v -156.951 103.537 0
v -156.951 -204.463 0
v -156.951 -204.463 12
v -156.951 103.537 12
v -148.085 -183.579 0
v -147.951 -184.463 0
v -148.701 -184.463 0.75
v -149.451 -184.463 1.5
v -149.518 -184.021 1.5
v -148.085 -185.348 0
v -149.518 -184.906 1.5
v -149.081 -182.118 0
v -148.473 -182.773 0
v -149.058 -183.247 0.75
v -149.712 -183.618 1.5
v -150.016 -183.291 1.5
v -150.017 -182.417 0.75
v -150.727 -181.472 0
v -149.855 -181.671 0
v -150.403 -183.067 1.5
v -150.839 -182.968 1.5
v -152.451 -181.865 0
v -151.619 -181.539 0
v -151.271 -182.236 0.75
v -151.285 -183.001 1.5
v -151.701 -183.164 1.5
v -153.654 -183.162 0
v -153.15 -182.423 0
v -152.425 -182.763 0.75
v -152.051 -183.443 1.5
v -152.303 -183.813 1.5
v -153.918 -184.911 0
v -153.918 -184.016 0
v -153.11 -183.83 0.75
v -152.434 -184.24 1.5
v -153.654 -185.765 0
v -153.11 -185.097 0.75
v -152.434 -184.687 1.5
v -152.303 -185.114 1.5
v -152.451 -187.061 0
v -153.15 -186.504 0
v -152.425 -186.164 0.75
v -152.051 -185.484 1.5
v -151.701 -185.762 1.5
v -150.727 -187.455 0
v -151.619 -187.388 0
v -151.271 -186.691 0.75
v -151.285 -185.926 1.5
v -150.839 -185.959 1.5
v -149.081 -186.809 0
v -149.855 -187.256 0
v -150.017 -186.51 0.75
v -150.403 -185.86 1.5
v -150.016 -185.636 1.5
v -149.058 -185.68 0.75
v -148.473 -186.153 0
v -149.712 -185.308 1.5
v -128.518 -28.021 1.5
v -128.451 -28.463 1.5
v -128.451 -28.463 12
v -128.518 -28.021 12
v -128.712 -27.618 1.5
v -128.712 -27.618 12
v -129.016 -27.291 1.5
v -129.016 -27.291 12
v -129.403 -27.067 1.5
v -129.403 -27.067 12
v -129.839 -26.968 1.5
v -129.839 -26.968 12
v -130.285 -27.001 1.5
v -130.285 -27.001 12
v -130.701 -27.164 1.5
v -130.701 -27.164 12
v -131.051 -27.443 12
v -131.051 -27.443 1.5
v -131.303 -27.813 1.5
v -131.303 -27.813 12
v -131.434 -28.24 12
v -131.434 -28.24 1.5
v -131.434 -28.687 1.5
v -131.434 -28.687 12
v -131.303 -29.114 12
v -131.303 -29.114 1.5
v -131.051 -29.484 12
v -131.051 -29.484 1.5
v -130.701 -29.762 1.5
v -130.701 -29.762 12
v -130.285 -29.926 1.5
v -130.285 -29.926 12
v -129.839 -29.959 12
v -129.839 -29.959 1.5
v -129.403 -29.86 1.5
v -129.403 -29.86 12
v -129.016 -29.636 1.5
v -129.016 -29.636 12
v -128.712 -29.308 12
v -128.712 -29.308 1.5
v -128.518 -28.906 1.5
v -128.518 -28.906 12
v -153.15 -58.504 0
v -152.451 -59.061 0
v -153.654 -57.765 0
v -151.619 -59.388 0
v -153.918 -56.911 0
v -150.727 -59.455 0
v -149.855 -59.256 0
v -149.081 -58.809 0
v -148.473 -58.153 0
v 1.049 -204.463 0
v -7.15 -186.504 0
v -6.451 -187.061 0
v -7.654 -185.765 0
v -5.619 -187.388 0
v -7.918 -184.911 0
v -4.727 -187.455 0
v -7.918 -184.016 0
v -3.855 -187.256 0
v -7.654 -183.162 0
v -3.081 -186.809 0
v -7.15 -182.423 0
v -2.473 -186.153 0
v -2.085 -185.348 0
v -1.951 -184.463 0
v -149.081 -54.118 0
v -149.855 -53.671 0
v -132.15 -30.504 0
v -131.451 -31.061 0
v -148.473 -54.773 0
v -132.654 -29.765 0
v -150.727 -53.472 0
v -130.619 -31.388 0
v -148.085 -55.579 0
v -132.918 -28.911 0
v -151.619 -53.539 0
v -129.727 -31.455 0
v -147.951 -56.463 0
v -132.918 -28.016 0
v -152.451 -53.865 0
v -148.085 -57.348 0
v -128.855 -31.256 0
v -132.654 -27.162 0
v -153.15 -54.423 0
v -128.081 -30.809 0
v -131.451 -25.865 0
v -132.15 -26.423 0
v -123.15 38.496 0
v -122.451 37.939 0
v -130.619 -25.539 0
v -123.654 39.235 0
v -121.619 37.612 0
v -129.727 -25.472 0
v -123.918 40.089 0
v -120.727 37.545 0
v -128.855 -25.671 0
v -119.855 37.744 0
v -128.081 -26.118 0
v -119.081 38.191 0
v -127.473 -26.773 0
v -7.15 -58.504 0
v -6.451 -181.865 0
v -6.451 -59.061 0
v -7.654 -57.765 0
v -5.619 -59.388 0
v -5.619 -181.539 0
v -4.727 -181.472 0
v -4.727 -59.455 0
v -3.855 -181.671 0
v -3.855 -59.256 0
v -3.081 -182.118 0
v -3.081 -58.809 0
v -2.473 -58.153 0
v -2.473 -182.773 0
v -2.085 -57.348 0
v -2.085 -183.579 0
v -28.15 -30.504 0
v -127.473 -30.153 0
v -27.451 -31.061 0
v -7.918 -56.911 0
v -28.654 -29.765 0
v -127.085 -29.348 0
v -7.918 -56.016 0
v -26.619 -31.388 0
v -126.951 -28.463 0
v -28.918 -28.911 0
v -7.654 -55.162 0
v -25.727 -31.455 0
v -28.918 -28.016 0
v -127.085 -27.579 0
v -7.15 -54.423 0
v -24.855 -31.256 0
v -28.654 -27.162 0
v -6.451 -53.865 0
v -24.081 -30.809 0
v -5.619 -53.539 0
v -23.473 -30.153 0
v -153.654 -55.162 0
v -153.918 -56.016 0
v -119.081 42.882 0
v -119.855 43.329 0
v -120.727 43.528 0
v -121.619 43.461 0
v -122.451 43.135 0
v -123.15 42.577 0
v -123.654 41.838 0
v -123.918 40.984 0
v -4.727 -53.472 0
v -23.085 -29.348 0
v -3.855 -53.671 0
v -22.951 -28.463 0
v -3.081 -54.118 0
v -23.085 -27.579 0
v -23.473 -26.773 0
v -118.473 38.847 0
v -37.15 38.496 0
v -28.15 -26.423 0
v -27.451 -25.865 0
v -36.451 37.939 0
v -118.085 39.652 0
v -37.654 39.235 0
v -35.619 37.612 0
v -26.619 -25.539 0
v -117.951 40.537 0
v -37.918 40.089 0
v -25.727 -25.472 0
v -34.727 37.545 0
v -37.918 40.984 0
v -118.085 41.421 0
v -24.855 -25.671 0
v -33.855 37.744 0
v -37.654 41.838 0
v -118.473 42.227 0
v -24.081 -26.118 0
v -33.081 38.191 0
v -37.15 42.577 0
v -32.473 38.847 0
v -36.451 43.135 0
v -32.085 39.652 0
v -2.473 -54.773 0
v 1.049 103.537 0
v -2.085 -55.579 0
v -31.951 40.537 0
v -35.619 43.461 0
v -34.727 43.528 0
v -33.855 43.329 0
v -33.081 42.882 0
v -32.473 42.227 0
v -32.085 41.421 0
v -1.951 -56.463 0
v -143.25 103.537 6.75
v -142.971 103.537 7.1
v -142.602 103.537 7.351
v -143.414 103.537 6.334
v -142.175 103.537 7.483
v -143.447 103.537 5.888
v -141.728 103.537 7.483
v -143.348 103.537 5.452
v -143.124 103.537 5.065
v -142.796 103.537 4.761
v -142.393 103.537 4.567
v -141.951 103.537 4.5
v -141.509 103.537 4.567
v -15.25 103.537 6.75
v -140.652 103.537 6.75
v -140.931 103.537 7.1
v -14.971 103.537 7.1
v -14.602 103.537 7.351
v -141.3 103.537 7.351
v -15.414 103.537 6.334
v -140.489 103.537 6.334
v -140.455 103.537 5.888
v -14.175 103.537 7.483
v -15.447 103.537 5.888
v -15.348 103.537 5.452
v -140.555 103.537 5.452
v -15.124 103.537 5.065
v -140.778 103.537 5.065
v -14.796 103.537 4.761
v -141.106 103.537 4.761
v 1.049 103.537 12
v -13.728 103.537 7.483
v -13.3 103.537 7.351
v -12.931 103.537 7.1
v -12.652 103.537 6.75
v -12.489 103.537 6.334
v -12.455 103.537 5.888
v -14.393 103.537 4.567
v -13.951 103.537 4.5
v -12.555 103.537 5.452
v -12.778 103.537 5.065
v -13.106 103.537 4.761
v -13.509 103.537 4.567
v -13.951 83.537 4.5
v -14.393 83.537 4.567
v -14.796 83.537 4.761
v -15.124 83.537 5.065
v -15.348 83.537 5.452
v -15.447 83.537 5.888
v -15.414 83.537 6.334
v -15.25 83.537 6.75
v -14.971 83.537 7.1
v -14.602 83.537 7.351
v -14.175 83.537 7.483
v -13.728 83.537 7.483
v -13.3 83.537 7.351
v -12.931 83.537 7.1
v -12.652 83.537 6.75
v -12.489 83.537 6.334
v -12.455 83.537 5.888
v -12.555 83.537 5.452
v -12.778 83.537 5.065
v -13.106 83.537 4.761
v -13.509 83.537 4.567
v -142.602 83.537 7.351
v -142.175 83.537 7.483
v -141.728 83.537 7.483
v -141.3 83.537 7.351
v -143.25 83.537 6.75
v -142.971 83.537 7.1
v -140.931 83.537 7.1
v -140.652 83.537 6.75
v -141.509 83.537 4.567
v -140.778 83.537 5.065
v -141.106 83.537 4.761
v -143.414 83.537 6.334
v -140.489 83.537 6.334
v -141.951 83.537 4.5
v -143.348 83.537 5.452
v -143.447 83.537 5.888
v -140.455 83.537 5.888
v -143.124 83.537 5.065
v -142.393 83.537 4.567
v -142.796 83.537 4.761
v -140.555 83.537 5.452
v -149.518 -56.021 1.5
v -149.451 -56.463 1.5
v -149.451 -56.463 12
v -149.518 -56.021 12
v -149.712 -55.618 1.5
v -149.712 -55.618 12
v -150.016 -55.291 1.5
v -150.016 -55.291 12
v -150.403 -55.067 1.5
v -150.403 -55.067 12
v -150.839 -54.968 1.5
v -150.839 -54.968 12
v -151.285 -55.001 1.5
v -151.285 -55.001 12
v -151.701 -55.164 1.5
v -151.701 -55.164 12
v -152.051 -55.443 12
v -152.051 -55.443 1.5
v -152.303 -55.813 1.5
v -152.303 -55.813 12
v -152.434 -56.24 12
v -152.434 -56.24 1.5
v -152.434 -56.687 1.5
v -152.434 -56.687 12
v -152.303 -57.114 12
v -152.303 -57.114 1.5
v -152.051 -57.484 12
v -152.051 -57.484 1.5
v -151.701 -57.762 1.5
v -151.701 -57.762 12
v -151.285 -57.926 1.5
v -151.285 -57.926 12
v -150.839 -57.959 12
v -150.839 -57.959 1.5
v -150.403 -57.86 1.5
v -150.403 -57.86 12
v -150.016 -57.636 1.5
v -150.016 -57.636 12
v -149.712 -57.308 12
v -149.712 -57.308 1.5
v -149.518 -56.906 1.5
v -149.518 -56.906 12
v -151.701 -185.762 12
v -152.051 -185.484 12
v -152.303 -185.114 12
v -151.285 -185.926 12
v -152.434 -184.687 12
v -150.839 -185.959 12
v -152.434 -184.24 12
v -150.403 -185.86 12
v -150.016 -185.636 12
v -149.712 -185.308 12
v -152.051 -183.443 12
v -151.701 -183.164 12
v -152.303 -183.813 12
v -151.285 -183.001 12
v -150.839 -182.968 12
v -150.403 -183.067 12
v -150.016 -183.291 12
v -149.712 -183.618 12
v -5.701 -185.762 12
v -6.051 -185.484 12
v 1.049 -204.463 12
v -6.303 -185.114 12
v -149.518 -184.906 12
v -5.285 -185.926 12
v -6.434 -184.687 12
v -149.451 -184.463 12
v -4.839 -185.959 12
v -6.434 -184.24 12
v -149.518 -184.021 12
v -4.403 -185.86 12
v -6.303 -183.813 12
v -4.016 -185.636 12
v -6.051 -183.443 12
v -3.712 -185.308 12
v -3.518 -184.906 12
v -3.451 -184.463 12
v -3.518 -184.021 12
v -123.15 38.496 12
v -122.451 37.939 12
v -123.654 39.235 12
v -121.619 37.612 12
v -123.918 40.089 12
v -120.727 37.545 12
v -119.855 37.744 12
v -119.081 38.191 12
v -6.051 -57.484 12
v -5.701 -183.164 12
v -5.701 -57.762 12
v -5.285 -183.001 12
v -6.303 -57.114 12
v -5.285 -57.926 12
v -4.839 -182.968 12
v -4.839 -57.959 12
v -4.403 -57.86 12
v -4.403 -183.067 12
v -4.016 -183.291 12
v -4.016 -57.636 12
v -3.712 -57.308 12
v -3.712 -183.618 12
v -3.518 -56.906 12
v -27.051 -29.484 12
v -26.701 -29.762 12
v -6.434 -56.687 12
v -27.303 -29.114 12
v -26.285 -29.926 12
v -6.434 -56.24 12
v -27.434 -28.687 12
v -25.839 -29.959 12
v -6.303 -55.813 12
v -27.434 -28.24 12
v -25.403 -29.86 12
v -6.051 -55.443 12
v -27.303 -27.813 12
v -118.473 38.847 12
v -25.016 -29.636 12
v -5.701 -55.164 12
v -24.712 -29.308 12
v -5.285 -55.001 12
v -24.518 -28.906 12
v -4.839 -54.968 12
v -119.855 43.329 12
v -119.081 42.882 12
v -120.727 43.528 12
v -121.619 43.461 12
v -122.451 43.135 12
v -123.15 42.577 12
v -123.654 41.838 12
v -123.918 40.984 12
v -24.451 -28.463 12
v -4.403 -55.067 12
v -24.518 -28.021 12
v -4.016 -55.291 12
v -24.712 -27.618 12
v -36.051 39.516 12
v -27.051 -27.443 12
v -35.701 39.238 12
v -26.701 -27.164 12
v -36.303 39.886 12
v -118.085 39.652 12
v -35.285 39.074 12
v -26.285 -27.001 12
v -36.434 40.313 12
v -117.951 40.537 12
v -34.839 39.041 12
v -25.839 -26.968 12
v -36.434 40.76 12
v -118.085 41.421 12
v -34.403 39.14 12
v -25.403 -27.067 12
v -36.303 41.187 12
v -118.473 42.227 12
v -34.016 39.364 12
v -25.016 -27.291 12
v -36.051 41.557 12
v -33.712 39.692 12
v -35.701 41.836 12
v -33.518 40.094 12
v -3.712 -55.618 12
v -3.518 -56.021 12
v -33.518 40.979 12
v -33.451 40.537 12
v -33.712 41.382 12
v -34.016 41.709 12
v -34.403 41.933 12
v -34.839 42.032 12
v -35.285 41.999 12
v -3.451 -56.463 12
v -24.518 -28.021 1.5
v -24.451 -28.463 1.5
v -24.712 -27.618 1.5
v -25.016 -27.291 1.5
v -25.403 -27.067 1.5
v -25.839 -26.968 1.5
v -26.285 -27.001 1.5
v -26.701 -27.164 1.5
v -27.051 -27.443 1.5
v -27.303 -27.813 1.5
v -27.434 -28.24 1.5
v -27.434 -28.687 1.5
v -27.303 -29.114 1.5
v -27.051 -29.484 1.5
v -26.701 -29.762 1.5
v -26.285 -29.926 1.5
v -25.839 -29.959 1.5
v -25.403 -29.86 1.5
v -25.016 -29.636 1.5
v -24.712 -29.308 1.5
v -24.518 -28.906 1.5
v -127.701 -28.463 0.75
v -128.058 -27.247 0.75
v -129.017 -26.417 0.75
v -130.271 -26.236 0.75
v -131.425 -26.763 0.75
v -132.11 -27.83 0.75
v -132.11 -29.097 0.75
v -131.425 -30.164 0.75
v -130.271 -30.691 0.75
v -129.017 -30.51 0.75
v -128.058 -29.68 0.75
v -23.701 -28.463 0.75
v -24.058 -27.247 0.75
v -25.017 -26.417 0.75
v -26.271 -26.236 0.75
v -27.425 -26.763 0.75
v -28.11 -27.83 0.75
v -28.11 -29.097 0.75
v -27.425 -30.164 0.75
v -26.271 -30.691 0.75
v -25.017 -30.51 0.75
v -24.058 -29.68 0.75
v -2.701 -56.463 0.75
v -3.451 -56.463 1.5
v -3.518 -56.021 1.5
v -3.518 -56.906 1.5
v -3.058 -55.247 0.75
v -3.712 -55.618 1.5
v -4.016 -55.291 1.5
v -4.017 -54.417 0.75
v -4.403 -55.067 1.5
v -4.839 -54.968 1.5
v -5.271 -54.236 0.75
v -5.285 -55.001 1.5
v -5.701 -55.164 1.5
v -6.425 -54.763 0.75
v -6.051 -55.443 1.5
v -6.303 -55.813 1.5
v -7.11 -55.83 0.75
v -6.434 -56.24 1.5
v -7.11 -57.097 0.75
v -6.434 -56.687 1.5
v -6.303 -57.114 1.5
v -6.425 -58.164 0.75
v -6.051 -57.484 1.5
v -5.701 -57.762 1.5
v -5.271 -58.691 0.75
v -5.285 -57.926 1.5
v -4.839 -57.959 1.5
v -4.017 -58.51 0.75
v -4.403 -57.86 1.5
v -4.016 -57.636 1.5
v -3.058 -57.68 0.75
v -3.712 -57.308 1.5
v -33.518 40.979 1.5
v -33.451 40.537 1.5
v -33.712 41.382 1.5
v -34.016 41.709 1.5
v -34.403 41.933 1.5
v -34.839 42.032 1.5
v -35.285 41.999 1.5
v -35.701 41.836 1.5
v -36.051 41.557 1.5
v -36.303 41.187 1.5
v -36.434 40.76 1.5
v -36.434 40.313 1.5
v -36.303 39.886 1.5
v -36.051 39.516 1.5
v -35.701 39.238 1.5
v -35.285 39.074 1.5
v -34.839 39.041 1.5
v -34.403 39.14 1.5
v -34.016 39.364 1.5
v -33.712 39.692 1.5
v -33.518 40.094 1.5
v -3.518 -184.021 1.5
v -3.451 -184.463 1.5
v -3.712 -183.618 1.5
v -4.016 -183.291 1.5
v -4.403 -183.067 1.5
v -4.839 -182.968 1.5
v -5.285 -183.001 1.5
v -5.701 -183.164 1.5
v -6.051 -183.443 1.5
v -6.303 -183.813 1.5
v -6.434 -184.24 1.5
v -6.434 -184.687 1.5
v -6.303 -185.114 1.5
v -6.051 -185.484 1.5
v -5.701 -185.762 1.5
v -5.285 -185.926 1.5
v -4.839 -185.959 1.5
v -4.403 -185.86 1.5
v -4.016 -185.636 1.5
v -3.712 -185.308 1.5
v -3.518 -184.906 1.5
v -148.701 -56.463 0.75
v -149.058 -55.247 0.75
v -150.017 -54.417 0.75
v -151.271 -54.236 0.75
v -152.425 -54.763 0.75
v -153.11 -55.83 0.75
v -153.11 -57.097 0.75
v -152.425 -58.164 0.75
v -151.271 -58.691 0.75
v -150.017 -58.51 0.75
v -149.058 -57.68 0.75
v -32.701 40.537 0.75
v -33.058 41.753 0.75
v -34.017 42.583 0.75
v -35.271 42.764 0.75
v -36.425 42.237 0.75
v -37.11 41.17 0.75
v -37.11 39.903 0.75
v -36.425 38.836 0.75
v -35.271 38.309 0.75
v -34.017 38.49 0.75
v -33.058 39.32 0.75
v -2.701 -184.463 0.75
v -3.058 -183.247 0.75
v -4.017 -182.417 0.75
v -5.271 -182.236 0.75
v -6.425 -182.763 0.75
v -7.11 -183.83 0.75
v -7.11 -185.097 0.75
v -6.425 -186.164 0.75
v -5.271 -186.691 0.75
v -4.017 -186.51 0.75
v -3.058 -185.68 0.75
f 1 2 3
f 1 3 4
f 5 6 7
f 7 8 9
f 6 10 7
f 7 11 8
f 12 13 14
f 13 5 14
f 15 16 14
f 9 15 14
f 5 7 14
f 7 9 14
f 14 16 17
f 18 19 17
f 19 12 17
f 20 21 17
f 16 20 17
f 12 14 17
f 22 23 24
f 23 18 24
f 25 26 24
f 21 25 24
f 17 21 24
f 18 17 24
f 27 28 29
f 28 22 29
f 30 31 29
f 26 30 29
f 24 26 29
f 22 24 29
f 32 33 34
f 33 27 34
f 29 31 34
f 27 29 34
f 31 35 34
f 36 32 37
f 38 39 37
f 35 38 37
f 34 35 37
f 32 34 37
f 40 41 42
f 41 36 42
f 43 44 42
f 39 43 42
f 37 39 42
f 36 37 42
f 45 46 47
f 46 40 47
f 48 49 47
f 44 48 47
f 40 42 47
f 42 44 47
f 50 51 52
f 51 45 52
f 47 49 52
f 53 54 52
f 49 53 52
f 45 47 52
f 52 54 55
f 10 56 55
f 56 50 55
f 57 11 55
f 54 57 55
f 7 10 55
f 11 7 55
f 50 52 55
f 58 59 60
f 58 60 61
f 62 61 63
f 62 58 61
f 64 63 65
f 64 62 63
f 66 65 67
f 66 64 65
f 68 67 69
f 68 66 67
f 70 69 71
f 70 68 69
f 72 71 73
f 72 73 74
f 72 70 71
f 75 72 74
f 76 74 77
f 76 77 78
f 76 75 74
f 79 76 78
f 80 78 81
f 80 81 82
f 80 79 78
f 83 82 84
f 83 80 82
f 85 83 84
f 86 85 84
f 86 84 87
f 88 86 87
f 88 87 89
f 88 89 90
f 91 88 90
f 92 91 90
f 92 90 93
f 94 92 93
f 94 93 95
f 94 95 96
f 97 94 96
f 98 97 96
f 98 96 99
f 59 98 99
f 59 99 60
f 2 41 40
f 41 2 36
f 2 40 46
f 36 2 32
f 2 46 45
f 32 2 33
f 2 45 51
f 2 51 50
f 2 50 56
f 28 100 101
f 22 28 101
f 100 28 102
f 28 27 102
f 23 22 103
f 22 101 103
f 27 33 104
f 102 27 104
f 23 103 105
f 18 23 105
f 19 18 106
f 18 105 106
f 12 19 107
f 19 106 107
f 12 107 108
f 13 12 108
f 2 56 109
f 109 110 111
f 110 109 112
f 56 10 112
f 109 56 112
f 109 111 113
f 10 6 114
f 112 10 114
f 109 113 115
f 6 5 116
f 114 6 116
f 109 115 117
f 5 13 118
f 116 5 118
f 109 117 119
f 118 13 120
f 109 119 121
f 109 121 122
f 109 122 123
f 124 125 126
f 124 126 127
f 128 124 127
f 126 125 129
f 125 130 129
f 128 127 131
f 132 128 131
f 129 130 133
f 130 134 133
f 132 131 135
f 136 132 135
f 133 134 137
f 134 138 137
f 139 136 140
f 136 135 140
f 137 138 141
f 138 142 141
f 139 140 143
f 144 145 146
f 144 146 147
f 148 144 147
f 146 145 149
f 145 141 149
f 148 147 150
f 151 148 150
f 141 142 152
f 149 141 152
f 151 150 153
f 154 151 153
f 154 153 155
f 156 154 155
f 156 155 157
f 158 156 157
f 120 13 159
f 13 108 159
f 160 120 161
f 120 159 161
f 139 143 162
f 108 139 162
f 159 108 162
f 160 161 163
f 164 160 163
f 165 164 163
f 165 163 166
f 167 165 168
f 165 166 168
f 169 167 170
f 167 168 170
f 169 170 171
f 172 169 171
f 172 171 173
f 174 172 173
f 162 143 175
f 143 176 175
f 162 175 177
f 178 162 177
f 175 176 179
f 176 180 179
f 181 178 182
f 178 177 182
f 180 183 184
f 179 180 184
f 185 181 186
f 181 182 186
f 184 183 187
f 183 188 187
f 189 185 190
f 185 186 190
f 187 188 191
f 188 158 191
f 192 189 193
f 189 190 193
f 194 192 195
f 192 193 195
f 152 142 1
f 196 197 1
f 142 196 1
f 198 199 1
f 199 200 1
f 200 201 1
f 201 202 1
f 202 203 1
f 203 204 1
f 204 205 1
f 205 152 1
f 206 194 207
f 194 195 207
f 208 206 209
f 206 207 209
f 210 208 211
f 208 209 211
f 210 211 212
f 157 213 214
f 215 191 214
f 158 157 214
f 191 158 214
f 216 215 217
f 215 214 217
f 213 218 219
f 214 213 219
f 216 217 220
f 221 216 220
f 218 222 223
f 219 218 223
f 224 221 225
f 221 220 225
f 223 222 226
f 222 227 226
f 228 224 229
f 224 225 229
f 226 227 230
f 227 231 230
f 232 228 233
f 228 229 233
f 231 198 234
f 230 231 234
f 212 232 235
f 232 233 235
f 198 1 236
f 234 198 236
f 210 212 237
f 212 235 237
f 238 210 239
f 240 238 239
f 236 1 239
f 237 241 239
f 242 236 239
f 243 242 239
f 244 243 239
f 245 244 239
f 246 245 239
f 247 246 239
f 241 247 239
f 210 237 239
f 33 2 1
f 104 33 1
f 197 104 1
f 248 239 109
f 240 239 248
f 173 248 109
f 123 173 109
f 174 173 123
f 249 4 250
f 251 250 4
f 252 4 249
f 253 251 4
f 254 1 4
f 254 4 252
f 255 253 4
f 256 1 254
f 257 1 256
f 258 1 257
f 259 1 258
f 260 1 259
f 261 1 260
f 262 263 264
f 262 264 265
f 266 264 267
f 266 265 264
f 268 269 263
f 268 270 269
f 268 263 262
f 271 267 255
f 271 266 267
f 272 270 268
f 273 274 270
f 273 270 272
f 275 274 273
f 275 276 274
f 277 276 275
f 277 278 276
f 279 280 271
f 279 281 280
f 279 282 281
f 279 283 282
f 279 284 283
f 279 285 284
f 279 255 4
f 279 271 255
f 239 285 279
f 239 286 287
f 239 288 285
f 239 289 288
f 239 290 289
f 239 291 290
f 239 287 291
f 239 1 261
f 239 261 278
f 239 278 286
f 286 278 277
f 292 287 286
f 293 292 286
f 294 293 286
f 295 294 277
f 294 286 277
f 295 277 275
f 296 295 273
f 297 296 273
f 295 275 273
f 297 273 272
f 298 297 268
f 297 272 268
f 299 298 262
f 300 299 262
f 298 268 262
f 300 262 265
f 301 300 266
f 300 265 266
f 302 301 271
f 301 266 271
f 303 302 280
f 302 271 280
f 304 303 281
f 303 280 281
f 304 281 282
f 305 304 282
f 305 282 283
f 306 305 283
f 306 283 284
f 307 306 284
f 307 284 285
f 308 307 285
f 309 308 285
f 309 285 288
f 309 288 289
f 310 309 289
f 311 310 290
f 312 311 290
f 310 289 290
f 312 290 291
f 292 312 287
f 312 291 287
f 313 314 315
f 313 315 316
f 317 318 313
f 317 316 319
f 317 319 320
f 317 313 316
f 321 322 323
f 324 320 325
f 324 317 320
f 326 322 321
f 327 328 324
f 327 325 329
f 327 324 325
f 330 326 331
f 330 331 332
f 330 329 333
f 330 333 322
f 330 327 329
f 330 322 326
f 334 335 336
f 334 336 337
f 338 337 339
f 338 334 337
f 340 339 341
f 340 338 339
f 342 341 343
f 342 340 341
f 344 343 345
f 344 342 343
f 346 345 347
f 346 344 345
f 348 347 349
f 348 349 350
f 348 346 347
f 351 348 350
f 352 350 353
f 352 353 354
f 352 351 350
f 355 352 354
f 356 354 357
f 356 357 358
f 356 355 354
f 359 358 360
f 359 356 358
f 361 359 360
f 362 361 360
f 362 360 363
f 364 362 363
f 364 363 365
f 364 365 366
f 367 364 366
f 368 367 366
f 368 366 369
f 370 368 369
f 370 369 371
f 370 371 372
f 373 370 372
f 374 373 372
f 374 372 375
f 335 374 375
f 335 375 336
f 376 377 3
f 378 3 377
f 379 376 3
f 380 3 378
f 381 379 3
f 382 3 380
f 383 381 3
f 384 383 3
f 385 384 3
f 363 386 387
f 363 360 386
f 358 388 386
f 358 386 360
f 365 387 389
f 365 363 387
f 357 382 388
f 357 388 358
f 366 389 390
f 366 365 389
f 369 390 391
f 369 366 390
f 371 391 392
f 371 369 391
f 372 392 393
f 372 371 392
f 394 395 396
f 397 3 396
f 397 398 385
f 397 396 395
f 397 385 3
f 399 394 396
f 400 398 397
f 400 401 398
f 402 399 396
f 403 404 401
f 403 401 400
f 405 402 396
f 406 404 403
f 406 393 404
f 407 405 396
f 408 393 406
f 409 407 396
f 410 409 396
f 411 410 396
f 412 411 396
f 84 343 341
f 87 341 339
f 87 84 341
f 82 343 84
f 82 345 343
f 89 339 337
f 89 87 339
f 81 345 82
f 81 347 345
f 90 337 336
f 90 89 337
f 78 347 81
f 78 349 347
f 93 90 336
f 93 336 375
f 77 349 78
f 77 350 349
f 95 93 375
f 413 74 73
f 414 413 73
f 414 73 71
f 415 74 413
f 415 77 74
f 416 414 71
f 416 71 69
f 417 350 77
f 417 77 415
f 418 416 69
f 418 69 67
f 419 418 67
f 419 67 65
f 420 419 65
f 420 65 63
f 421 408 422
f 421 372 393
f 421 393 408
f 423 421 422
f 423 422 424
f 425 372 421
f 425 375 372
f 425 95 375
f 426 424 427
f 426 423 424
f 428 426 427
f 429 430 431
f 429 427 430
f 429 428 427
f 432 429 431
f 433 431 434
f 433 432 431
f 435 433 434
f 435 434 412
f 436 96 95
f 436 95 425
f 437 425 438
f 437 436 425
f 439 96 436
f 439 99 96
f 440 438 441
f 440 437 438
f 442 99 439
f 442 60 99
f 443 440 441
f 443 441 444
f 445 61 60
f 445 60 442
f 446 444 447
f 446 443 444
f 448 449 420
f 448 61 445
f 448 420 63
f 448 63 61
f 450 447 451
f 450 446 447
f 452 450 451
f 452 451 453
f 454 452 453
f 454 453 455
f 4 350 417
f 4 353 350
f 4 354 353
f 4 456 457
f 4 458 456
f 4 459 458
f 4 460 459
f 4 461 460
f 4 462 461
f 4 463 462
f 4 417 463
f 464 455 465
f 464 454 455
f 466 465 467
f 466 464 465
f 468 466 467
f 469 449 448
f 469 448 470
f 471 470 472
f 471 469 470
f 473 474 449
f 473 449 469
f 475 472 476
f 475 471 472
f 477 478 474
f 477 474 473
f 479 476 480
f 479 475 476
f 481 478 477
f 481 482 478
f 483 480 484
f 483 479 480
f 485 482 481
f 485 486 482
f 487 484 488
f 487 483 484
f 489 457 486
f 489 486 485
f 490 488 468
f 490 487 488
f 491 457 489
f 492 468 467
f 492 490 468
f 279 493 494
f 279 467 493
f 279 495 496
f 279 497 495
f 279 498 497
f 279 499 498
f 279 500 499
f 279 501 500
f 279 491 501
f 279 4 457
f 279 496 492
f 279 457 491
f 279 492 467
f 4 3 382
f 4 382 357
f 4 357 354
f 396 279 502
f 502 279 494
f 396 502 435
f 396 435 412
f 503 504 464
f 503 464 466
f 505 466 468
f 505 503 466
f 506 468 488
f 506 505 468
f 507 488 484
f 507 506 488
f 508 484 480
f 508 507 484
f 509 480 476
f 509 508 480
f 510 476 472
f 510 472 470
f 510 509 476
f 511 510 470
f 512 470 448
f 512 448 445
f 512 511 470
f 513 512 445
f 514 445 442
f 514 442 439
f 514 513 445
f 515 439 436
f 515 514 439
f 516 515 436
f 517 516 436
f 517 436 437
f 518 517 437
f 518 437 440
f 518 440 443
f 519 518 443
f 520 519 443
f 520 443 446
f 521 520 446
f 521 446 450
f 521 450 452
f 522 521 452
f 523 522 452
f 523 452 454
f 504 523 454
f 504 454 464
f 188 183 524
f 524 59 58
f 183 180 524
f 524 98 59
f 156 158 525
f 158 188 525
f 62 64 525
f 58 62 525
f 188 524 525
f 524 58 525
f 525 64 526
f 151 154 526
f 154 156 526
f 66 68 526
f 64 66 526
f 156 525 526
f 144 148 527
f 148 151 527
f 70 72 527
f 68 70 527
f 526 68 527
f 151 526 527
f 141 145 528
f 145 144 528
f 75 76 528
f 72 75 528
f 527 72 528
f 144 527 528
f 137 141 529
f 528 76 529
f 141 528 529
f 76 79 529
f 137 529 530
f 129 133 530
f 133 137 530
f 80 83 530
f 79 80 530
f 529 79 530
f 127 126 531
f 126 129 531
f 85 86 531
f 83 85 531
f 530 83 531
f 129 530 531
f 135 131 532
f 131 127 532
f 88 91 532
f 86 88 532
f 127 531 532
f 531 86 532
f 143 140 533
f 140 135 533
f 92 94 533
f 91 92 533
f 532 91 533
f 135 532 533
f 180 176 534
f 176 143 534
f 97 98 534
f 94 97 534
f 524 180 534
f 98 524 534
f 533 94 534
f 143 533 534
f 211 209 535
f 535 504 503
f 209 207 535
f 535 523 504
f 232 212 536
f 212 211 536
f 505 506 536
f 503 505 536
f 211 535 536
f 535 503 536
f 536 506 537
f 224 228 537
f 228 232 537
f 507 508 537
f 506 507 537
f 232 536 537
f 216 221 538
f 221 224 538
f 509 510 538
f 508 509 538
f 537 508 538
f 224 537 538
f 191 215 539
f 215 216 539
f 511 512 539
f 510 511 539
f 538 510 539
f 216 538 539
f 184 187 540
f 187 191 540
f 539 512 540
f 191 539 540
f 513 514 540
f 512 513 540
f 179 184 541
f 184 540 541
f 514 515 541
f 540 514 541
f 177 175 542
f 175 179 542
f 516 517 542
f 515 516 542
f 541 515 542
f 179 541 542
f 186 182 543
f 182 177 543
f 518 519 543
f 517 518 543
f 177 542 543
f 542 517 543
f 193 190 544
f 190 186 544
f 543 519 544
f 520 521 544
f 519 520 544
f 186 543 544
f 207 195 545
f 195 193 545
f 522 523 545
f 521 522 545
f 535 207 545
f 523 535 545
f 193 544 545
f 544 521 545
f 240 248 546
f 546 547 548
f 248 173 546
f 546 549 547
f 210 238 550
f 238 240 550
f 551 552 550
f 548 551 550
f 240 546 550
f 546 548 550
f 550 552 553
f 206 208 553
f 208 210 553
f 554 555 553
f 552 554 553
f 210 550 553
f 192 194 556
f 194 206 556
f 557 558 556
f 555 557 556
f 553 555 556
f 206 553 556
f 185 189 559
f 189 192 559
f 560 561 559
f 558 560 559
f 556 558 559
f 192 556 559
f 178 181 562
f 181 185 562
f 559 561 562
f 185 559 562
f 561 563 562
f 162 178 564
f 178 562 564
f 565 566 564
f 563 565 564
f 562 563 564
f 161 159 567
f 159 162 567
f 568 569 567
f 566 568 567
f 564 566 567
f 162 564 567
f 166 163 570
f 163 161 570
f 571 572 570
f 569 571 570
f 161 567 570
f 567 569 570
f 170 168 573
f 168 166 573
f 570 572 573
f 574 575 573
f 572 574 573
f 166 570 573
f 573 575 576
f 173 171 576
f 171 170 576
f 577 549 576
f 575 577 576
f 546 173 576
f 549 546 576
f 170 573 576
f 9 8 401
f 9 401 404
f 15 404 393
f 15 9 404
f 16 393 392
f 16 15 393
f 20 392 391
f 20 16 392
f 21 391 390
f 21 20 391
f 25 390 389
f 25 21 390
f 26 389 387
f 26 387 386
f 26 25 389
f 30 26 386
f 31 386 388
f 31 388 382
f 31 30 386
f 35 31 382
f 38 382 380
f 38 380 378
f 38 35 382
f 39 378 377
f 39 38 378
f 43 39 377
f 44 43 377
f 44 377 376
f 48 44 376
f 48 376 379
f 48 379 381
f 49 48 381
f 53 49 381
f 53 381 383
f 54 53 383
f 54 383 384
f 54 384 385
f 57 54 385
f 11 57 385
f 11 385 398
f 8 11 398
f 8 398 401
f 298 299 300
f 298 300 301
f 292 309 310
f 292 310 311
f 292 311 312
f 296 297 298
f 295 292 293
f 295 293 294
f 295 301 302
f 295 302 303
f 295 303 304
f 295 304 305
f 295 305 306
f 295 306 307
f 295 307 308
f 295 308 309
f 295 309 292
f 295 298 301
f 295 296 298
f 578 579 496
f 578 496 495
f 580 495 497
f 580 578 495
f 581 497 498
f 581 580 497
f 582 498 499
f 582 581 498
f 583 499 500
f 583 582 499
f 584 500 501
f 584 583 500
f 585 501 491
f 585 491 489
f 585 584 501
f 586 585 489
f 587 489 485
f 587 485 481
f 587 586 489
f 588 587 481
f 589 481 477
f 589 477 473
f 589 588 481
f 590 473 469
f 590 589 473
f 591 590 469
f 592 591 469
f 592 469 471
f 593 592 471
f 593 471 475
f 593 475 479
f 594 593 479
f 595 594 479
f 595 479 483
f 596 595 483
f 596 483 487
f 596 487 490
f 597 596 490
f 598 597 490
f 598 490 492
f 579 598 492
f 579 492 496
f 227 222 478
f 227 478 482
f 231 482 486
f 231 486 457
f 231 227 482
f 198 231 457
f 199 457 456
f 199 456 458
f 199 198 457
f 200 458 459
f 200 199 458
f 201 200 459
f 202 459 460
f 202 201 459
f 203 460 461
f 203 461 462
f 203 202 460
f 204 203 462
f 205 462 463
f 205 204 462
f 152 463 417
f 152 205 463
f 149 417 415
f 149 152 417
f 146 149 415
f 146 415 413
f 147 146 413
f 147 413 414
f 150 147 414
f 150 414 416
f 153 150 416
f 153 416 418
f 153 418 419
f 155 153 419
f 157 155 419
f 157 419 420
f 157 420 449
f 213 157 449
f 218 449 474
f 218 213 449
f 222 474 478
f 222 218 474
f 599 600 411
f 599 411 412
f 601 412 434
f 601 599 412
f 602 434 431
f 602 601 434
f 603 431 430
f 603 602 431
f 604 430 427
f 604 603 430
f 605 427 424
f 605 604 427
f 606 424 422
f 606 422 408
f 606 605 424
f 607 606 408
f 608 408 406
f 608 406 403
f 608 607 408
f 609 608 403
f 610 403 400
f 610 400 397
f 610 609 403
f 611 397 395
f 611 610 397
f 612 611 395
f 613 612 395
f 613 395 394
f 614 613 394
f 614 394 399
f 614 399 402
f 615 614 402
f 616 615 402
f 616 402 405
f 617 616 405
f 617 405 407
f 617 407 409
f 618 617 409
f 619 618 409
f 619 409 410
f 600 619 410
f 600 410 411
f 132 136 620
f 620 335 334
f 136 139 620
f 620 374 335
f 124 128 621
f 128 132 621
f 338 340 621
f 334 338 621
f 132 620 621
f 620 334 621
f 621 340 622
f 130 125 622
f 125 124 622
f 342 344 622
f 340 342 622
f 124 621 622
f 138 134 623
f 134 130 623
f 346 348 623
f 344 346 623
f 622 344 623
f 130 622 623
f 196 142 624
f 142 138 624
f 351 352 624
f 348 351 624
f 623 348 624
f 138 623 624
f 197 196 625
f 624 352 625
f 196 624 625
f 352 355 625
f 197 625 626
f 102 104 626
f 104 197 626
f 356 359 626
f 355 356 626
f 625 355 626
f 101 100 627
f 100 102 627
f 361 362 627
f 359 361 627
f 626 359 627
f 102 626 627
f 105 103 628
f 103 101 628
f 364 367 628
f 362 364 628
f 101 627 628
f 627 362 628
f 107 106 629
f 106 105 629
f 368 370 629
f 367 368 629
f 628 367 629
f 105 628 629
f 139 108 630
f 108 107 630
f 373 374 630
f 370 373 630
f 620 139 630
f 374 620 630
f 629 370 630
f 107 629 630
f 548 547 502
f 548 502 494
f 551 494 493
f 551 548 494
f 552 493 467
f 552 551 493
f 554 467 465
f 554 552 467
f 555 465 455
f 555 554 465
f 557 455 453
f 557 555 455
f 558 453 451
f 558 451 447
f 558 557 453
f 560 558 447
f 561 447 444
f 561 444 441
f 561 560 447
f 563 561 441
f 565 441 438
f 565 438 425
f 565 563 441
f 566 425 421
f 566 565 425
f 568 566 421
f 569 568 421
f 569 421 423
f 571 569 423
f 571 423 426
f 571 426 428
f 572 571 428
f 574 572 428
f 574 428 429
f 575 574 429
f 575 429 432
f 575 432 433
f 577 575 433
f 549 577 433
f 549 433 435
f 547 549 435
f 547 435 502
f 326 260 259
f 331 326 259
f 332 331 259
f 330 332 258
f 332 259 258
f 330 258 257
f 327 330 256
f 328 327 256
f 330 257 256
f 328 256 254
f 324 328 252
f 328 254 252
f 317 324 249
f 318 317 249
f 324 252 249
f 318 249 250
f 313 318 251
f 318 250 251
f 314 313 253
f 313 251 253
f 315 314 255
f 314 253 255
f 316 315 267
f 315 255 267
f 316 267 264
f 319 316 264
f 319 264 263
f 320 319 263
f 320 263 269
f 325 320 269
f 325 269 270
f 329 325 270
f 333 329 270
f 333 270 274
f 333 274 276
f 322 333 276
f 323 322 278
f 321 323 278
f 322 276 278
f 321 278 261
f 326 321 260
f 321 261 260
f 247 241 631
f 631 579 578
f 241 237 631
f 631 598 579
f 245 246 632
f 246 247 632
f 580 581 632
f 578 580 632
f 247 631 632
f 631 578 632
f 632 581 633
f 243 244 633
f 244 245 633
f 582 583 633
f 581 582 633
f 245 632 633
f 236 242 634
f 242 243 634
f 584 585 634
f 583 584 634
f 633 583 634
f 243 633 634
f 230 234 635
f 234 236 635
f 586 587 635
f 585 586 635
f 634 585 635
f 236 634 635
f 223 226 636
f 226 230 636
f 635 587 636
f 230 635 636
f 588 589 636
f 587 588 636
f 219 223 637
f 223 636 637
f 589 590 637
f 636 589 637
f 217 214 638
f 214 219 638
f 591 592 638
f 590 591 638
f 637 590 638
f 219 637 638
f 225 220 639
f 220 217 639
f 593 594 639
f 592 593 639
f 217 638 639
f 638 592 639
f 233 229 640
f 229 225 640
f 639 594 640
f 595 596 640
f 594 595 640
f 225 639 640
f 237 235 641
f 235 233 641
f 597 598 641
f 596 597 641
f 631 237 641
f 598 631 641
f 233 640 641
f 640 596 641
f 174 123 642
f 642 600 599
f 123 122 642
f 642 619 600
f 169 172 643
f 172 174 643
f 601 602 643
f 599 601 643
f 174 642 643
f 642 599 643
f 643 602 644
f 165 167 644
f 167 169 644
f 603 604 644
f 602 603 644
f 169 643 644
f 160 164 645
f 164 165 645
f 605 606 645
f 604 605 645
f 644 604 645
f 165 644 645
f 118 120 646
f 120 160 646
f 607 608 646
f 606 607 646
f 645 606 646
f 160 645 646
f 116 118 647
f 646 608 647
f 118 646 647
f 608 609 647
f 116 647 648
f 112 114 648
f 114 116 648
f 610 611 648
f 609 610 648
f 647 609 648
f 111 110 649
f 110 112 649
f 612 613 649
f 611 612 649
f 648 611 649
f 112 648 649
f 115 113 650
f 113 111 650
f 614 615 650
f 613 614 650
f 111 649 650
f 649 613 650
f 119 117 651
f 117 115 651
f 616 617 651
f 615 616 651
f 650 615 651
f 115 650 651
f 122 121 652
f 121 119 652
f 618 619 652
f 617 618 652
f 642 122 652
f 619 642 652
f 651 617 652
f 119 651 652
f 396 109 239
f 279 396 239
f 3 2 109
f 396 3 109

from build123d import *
from OCP.BRepAlgoAPI import BRepAlgoAPI_Cut
from OCP.TopTools import TopTools_ListOfShape

# Parameters (mm, degrees)
SKETCH1_W           = 158
SKETCH1_H           = 308
SKETCH1_R           = 1.5
SKETCH1_R_2         = 3
BOSS_EXTRUDE1_DEPTH = 12
SKETCH5_R           = 3
CUT_EXTRUDE4_DEPTH  = 3
CUT_EXTRUDE4_TAPER  = 45
CUT_EXTRUDE5_START  = 103.536585
SKETCH6_R           = 1.5
CUT_EXTRUDE5_DEPTH  = 20


with BuildPart() as part:
    # Sketch1 → Boss-Extrude1 (new body)
    with BuildSketch(Plane.XY):
        with Locations((-77.951219512, -50.463414634)):
            Rectangle(SKETCH1_W, SKETCH1_H)
        with Locations((-129.951219512, -28.463414634)):
            Circle(SKETCH1_R, mode=Mode.SUBTRACT)
        with Locations((-25.951219512, -28.463414634)):
            Circle(SKETCH1_R, mode=Mode.SUBTRACT)
        with Locations((-34.951219512, 40.536585366)):
            Circle(SKETCH1_R, mode=Mode.SUBTRACT)
        with Locations((-4.951219512, -184.463414634)):
            Circle(SKETCH1_R, mode=Mode.SUBTRACT)
        with Locations((-4.951219512, -56.463414634)):
            Circle(SKETCH1_R, mode=Mode.SUBTRACT)
        with Locations((-150.951219512, -184.463414634)):
            Circle(SKETCH1_R, mode=Mode.SUBTRACT)
        with Locations((-150.951219512, -56.463414634)):
            Circle(SKETCH1_R, mode=Mode.SUBTRACT)
        with Locations((-120.951219512, 40.536585366)):
            Circle(SKETCH1_R_2, mode=Mode.SUBTRACT)
    extrude(amount=BOSS_EXTRUDE1_DEPTH)

    # Sketch5 → Cut-Extrude4 (cut)
    with BuildSketch(Plane.XY):
        with Locations((-25.951219512, -28.463414634)):
            Circle(SKETCH5_R)
        with Locations((-129.951219512, -28.463414634)):
            Circle(SKETCH5_R)
        with Locations((-34.951219512, 40.536585366)):
            Circle(SKETCH5_R)
        with Locations((-4.951219512, -56.463414634)):
            Circle(SKETCH5_R)
        with Locations((-4.951219512, -184.463414634)):
            Circle(SKETCH5_R)
        with Locations((-150.951219512, -56.463414634)):
            Circle(SKETCH5_R)
        with Locations((-150.951219512, -184.463414634)):
            Circle(SKETCH5_R)
    extrude(amount=CUT_EXTRUDE4_DEPTH, taper=CUT_EXTRUDE4_TAPER, mode=Mode.SUBTRACT)


with BuildPart() as cut_extrude5_tool:
    # Sketch6 → Cut-Extrude5 (new body)
    with BuildSketch(Plane(origin=(0, 0, 0), x_dir=(1, 0, 0), z_dir=(0, 1, 0)).offset(CUT_EXTRUDE5_START)):
        with Locations(Location((-141.951219512, -6, 0), (0, 0, 90))):
            Circle(SKETCH6_R)
        with Locations(Location((-13.951219512, -6, 0), (0, 0, 90))):
            Circle(SKETCH6_R)
    extrude(amount=-CUT_EXTRUDE5_DEPTH)


with BuildPart() as part_1:
    add(part.part)

    # Cut-Extrude5: cut by cut_extrude5_tool, with a tolerance
    cut_extrude5_stock = TopTools_ListOfShape()
    cut_extrude5_stock.Append(part_1.part.wrapped)
    cut_extrude5_tools = TopTools_ListOfShape()
    cut_extrude5_tools.Append(cut_extrude5_tool.part.wrapped)
    cut_extrude5_cut = BRepAlgoAPI_Cut()
    cut_extrude5_cut.SetArguments(cut_extrude5_stock)
    cut_extrude5_cut.SetTools(cut_extrude5_tools)
    cut_extrude5_cut.SetFuzzyValue(0.00001)
    cut_extrude5_cut.Build()
    add(Compound.cast(cut_extrude5_cut.Shape()).solids(), mode=Mode.REPLACE)


solid = part_1.part
